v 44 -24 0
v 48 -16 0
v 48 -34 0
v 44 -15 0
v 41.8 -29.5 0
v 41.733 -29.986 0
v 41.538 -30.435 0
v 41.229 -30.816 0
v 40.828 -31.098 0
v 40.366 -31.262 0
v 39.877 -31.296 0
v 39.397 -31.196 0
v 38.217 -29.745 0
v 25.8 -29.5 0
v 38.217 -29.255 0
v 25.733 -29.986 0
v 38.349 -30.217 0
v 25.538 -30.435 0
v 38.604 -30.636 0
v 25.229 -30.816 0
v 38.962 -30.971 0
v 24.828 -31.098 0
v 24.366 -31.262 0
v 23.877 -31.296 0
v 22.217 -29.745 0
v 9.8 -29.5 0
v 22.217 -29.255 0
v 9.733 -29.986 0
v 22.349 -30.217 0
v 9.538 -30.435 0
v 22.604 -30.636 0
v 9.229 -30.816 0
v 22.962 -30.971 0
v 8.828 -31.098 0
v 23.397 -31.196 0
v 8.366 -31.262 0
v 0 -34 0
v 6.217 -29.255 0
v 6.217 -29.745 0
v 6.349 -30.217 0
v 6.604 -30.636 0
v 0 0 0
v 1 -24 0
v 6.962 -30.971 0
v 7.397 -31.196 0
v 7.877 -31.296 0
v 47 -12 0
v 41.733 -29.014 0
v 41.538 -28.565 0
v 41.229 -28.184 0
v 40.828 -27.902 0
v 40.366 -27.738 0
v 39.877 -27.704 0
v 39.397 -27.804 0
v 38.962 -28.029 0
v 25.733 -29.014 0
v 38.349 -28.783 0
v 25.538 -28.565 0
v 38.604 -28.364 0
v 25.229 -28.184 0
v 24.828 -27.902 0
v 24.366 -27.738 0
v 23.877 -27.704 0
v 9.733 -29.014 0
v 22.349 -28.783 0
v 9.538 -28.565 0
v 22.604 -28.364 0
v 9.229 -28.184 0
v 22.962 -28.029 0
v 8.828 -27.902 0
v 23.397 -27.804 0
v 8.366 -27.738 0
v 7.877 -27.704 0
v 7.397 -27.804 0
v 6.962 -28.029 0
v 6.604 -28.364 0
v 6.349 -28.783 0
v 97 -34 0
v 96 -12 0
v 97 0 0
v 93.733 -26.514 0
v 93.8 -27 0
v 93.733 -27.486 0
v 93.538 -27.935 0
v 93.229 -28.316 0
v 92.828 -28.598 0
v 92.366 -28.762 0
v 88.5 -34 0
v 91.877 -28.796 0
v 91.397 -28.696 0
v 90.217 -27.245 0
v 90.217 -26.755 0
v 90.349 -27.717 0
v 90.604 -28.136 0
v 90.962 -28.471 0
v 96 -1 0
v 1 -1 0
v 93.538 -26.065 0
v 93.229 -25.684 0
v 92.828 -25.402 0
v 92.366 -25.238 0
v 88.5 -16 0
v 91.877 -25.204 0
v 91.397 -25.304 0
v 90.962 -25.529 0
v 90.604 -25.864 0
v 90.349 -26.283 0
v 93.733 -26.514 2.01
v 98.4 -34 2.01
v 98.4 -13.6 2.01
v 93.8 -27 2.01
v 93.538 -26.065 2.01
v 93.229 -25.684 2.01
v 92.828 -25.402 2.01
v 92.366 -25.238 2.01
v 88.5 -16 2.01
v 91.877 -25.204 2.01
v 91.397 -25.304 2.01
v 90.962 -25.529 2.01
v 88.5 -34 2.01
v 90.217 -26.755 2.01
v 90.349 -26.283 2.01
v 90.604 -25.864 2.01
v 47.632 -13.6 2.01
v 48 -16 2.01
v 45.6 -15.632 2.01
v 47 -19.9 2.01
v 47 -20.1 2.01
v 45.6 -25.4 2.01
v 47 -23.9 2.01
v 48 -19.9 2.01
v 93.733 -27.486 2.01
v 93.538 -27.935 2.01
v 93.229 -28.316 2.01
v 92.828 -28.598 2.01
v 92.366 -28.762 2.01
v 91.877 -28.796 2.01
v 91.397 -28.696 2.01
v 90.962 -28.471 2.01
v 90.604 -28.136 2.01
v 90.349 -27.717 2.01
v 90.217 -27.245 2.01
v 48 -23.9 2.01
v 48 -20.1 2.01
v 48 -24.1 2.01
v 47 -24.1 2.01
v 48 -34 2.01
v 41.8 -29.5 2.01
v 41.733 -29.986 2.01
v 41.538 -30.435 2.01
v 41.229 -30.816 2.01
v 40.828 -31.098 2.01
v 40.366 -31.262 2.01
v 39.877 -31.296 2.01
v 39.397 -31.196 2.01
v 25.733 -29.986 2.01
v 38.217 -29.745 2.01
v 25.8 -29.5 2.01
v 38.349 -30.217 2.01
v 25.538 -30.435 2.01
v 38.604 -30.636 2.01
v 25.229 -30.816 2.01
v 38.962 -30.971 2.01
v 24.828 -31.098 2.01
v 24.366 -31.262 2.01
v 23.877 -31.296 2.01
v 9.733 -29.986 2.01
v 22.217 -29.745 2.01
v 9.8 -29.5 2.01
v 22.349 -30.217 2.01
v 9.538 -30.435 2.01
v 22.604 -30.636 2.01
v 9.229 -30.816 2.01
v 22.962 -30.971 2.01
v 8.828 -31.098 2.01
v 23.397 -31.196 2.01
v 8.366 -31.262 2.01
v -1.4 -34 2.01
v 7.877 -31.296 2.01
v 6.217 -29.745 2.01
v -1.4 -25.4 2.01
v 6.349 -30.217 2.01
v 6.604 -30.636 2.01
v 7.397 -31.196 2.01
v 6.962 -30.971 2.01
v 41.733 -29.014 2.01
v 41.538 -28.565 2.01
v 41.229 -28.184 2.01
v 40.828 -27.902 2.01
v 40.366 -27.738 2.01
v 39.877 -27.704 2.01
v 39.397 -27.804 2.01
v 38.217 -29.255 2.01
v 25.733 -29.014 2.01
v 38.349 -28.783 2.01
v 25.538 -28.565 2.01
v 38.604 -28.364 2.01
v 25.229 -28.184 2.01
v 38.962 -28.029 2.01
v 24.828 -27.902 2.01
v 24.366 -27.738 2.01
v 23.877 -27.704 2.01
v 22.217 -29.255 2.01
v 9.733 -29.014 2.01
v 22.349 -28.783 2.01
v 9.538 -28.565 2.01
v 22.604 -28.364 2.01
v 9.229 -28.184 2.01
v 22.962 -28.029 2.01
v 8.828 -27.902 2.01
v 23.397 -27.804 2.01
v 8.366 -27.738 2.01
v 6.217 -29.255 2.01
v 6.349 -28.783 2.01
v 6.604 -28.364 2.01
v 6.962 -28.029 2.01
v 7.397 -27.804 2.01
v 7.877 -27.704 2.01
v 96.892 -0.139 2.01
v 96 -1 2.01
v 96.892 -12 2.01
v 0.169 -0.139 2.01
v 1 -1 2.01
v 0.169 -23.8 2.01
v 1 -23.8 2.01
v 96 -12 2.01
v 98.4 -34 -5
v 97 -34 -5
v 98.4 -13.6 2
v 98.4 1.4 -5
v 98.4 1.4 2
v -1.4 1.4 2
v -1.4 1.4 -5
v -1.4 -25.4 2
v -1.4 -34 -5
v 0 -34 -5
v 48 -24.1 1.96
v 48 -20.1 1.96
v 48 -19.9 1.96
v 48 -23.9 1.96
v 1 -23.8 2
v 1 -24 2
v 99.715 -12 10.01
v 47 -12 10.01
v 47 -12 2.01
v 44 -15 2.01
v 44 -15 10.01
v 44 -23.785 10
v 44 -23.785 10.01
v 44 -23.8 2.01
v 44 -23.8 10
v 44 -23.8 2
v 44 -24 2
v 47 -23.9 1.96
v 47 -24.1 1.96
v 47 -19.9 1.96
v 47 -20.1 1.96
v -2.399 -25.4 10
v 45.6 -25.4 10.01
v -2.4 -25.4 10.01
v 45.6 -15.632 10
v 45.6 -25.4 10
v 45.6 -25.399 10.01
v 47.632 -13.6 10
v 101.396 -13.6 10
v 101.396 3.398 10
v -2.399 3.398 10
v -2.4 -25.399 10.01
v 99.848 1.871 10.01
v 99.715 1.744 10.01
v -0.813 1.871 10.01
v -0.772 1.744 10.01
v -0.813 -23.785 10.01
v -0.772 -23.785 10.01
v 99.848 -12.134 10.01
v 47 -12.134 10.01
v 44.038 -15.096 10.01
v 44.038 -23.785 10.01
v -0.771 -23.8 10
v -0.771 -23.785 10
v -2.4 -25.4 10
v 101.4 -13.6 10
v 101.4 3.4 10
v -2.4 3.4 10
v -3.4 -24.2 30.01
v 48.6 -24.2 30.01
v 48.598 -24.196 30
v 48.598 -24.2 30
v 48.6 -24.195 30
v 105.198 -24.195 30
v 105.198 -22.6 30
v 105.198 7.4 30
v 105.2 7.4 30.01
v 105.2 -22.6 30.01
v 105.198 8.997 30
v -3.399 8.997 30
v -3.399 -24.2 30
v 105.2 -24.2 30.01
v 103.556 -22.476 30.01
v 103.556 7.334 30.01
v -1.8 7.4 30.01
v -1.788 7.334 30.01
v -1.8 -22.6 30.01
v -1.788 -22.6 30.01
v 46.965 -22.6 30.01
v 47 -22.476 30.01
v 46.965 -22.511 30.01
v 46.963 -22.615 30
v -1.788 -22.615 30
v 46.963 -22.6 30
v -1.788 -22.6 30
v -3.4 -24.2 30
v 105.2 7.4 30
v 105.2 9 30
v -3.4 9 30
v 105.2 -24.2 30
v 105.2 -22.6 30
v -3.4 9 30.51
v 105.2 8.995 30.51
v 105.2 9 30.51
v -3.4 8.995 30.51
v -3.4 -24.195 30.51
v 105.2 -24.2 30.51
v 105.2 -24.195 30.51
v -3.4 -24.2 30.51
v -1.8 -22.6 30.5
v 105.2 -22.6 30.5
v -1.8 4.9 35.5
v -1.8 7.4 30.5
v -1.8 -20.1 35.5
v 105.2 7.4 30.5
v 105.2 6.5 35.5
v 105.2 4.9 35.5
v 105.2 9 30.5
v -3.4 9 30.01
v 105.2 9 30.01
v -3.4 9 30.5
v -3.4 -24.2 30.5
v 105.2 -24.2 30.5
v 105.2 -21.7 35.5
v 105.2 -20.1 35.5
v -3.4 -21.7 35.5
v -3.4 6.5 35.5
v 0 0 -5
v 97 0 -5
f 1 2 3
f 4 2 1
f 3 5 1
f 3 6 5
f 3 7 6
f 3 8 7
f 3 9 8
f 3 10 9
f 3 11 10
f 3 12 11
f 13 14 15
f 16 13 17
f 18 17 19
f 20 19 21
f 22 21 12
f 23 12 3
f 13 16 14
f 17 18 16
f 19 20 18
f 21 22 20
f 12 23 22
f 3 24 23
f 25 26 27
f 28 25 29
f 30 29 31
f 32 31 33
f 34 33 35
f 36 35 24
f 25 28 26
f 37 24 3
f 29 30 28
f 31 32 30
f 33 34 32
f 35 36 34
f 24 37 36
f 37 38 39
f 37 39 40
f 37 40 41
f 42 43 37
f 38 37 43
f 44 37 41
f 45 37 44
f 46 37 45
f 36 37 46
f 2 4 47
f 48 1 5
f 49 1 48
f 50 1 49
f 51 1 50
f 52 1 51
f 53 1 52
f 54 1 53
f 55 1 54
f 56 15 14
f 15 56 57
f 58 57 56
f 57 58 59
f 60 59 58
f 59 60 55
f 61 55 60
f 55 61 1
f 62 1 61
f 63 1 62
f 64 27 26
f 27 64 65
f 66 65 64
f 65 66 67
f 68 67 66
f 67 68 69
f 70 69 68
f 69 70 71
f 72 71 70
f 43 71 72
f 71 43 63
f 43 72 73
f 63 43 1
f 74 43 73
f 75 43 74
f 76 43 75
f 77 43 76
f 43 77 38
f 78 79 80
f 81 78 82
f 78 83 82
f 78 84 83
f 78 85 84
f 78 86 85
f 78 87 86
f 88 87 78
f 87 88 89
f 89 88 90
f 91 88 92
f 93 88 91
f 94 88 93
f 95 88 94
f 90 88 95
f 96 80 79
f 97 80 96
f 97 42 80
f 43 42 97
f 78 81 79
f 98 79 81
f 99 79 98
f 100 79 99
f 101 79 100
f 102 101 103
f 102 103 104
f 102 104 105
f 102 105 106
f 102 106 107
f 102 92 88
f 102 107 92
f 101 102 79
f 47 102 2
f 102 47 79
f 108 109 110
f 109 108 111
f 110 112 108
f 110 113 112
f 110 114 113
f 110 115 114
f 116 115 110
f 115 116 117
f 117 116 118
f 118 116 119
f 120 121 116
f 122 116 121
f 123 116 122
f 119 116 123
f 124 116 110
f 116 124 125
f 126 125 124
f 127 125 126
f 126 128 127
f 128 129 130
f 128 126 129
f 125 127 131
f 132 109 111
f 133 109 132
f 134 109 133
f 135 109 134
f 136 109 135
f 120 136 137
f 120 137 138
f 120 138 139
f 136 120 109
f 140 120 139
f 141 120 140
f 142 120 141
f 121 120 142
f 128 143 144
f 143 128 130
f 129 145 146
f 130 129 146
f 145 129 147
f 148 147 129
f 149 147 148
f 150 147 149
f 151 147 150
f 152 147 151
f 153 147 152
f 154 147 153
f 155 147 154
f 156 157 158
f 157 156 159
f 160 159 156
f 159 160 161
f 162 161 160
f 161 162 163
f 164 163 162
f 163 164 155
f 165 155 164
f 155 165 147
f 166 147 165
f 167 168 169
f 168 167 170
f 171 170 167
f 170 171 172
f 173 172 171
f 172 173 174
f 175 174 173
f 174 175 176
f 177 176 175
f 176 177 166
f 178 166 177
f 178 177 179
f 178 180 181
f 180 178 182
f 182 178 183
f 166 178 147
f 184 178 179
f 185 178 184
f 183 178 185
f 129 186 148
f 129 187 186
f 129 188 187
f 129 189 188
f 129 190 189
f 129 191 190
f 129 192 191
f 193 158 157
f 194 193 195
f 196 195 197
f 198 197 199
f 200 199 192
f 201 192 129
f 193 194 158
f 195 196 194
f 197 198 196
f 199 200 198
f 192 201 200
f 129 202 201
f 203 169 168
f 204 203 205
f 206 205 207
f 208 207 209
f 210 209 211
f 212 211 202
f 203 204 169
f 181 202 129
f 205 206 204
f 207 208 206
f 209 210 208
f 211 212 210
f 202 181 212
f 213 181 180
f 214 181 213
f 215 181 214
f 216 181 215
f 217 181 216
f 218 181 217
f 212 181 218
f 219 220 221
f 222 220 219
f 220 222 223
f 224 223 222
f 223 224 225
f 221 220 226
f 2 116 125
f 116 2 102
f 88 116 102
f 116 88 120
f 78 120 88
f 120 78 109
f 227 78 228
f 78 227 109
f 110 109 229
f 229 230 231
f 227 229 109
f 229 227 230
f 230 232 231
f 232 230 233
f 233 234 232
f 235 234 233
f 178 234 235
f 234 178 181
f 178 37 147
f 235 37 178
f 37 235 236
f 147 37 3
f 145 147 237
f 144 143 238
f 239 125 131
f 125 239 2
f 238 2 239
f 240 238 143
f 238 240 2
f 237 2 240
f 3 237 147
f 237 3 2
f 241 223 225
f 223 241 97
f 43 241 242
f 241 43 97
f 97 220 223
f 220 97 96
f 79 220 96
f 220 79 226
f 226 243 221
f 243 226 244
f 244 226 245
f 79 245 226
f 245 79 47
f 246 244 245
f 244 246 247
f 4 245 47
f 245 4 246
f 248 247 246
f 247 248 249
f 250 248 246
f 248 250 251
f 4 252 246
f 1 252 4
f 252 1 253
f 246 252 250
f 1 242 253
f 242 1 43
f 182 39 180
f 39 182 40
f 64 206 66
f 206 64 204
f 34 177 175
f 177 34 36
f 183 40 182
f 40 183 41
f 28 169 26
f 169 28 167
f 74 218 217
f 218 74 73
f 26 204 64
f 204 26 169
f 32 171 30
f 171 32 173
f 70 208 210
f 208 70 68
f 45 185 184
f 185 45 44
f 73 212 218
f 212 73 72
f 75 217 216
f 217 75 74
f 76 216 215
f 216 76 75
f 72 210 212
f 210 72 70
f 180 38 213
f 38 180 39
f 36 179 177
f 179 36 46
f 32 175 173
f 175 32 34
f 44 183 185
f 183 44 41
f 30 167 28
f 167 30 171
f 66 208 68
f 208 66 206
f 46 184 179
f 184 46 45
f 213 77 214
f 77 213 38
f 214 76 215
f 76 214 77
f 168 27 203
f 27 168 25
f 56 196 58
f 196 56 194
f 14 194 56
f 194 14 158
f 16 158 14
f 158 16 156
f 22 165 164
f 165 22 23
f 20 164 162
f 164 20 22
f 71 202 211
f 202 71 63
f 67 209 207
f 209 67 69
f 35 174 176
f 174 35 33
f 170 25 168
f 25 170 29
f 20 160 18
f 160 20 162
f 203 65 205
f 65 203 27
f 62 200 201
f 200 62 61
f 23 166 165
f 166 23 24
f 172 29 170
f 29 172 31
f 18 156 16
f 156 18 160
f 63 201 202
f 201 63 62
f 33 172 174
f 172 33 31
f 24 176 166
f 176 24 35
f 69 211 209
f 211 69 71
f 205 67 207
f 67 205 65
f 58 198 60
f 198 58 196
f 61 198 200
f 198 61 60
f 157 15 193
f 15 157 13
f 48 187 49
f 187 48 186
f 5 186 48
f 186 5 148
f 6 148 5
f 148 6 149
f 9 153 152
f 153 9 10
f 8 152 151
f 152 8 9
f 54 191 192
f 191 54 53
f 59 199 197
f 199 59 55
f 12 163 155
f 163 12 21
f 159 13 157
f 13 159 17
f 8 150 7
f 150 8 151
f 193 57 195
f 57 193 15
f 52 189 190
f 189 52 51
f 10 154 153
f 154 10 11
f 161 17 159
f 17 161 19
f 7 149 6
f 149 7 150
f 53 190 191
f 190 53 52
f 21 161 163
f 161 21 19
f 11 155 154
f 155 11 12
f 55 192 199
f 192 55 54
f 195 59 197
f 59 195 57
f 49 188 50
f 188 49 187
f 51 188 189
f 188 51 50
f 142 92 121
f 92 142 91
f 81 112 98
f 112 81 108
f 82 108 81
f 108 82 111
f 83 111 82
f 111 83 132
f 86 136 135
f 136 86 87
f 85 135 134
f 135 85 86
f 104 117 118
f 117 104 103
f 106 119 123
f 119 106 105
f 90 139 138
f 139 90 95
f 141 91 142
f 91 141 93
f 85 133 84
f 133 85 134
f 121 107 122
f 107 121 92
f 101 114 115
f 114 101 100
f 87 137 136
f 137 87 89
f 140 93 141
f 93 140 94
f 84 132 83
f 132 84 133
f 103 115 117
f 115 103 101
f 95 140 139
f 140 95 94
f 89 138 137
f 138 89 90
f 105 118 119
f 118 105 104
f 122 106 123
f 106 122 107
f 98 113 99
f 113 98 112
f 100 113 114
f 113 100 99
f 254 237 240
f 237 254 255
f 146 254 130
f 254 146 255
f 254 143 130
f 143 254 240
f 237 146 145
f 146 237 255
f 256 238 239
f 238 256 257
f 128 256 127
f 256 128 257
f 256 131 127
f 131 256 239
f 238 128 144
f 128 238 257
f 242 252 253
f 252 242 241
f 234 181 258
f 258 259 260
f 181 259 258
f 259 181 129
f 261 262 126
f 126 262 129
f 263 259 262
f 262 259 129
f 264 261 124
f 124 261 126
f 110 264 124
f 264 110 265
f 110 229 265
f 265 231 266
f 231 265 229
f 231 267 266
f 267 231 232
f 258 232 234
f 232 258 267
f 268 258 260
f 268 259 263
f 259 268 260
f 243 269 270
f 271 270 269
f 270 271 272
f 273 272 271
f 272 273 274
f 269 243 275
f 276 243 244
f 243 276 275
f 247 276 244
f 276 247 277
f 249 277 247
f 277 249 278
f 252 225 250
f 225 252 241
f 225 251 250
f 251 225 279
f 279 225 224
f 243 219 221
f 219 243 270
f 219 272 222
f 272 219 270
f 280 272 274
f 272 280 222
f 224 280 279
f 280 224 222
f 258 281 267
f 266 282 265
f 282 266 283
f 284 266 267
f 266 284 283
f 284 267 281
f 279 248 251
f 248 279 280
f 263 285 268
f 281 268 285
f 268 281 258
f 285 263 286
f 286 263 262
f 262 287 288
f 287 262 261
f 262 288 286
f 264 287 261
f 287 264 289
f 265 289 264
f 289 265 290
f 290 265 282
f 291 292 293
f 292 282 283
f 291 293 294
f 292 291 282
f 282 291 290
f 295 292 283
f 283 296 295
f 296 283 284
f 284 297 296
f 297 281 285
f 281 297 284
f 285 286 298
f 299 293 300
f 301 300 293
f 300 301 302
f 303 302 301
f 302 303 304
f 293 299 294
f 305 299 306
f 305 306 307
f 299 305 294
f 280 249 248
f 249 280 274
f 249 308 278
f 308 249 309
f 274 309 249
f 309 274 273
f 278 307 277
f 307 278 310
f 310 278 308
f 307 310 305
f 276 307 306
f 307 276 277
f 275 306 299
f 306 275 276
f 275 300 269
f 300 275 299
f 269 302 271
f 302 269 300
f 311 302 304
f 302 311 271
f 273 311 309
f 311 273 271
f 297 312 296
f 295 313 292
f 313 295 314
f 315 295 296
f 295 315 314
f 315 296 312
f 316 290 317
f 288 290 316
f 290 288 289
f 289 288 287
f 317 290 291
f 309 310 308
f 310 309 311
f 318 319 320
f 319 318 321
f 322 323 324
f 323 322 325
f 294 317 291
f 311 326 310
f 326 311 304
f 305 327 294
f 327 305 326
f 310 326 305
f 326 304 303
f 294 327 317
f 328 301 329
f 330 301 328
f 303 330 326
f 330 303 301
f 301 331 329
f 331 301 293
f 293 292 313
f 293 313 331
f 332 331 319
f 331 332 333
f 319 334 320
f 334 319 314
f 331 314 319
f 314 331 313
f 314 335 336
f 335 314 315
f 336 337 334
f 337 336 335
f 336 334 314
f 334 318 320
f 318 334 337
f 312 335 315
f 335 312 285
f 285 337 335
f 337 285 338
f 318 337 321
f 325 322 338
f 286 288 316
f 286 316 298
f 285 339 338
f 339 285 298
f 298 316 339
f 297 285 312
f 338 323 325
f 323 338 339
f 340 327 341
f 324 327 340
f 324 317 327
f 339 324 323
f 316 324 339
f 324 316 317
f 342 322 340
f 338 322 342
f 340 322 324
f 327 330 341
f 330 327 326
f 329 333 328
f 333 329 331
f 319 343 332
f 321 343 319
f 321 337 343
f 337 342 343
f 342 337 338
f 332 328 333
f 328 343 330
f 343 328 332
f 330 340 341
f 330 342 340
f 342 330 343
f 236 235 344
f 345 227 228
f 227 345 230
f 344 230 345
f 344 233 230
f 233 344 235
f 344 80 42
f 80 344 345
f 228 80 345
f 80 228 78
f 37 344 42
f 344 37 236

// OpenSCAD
$fs=0.5;
$fa=1;
$fn=0;

module lip(th = 2) {
  //th = 2;
  linear_extrude(5.01) polygon([
    [-th, th], [97+th, th], [97+th, -34], [97, -34], [97, 0], [0, 0], [0, -34], [-th, -34]
   ]);
}

module mask(th = 2) {
  //th = 2;
  shape = [
    [-th, th], [97+th, th], [97+th, -34], [95-6.5, -34],
    [95-6.5, -16], [1+43+4, -16], [1+43+4, -34], [-th, -34]
  ];
  hole = [
    [1, -1], [96, -1], [96, -12], [1+43+3, -12],
    [1+43, -12-3], [1+43, -24], [1, -24]];

  difference() {
    linear_extrude(2.01) polygon(concat(shape, hole), [[0, 1, 2, 3, 4, 5, 6, 7], [8, 9, 10, 11, 12, 13, 14]]);
  
    translate([8, -34+4.5, -0.5]) cylinder(h = 3, r = 1.8);
    translate([8+16, -34+4.5, -0.5]) cylinder(h = 3, r = 1.8);
    translate([8+16+16, -34+4.5, -0.5]) cylinder(h = 3, r = 1.8);
    translate([95-3, -34+7, -0.5]) cylinder(h = 3, r = 1.8);
    translate([1+43+3.5, -24, 2.01]) cube([1, 0.2, 0.1], center=true);
    translate([1+43+3.5, -20, 2.01]) cube([1, 0.2, 0.1], center=true);
  }
}

function reverse(list) = [ for (i = [len(list)-1 : -1 : 0]) list[i] ];

// https://stackoverflow.com/a/78582473
module extrude_between(points0, points1, height, convexity=2) {
    N = len(points0);
    assert(len(points1) == N);
    bottom_pts = [for (i=[0:N-1]) [points0[i].x, points0[i].y, 0]];
    top_pts    = [for (i=[0:N-1]) [points1[i].x, points1[i].y, height]];
    bottom_face = [for (i=[0:N-1]) i];
    top_face    = [for (i=[0:N-1]) 2*N - i - 1];
    side_faces  = [for (i=[0:N-1]) let (j=(i+1)%N) [i+N, j+N, j, i]];
    polyhedron(
        [each bottom_pts, each top_pts],
        [bottom_face, each side_faces, top_face],
        convexity=convexity
    );
}


/*module duct1(lipth, dth = 2) {
  shape = [
    [-lipth, lipth], [97+lipth, lipth], [97+lipth, -12-dth], [1+43+3+sqrt(dth)/2, -12-dth],
    [1+43+dth, -12-3-sqrt(dth)/2], [1+43+dth, -26+(dth-1)], [-lipth, -26+(dth-1)],
  ];

  hole = [
    [shape[0][0]+dth, shape[0][1]-dth],
    [shape[1][0]-dth, shape[1][1]-dth],
    [shape[2][0]-dth, shape[2][1]+dth],
    [shape[3][0]-sqrt(dth)/2, shape[3][1]+dth],
    [shape[4][0]-dth, shape[4][1]+sqrt(dth)/2],
    [shape[5][0]-dth, shape[5][1]+dth],
    [shape[6][0]+dth, shape[6][1]+dth],
  ];

    linear_extrude(10.01) polygon(concat(shape, hole), [[0, 1, 2, 3, 4, 5, 6], [7, 8, 9, 10, 11, 12, 13]]);  
}*/

module duct1(lipth, dth = 2) {
  shape0 = [
    [-lipth, lipth],
    [97+lipth, lipth],
    [97+lipth, -12-dth],
    [1+43+3+sqrt(dth)/2, -12-dth],
    [1+43+dth, -12-3-sqrt(dth)/2],
    [1+43+dth, -26+(dth-1)],
    [-lipth, -26+(dth-1)],
  ];

  skewLeft = 1;
  skewTop = 2;
  skewRight = 3;

  shape1 = [
    [shape0[0][0]-skewLeft, shape0[0][1]+skewTop],
    [shape0[1][0]+skewRight, shape0[1][1]+skewTop],
    [shape0[2][0]+skewRight, shape0[2][1]],
    shape0[3],
    shape0[4],
    shape0[5],
    [shape0[6][0]-skewLeft, shape0[6][1]],
  ];

  //extrude_between(shape0, shape1, 8.01);
  
  hole0 = [
    [shape0[0][0]+dth, shape0[0][1]-dth],
    [shape0[1][0]-dth, shape0[1][1]-dth],
    [shape0[2][0]-dth, shape0[2][1]+dth],
    [shape0[3][0]-sqrt(dth)/2, shape0[3][1]+dth],
    [shape0[4][0]-dth, shape0[4][1]+sqrt(dth)/2],
    [shape0[5][0]-dth, shape0[5][1]+dth],
    [shape0[6][0]+dth, shape0[6][1]+dth],
  ];

  hole1 = [
    [hole0[0][0]-skewLeft, hole0[0][1]+skewTop],
    [hole0[1][0]+skewRight, hole0[1][1]+skewTop],
    [hole0[2][0]+skewRight, hole0[2][1]],
    hole0[3],
    hole0[4],
    hole0[5],
    [hole0[6][0]-skewLeft, hole0[6][1]],
  ];

    difference() {
      extrude_between(reverse(shape0), reverse(shape1), 8.01);
      translate([0, 0, -0.25]) extrude_between(reverse(hole0), reverse(hole1), 8.5);
    }
}

module duct2(lipth, dth = 2) {
  shape0 = [
    [-1-lipth, 2+lipth],
    [100+lipth, 2+lipth],
    [100+lipth, -12-dth],
    [1+43+3+sqrt(dth)/2, -12-dth],
    [1+43+dth, -12-3-sqrt(dth)/2],
    [1+43+dth, -26+(dth-1)],
    [-1-lipth, -26+(dth-1)],
  ];

  skewLeft = 1;
  skewTop = 4 + dth;
  skewRight = 3.8;
  skewBottomNarrow = 9 + dth;

  shape1 = [
    [shape0[0][0]-skewLeft, shape0[0][1]+skewTop],
    [shape0[1][0]+skewRight, shape0[1][1]+skewTop],
    [shape0[2][0]+skewRight, shape0[2][1]-skewBottomNarrow],
    [shape0[3][0]+5,shape0[3][1]-skewBottomNarrow],
    [shape0[4][0]+3,shape0[3][1]-skewBottomNarrow],
    [shape0[5][0]-5,shape0[3][1]-skewBottomNarrow],
    [shape0[6][0]-skewLeft, shape0[3][1]-skewBottomNarrow],
  ];

  hole0 = [
    [shape0[0][0]+dth, shape0[0][1]-dth],
    [shape0[1][0]-dth, shape0[1][1]-dth],
    [shape0[2][0]-dth, shape0[2][1]+dth],
    [shape0[3][0]-sqrt(dth)/2, shape0[3][1]+dth],
    [shape0[4][0]-dth, shape0[4][1]+sqrt(dth)/2],
    [shape0[5][0]-dth, shape0[5][1]+dth],
    [shape0[6][0]+dth, shape0[6][1]+dth],
  ];

  hole1 = [
    [hole0[0][0]-skewLeft, hole0[0][1]+skewTop],
    [hole0[1][0]+skewRight, hole0[1][1]+skewTop],
    [hole0[2][0]+skewRight, hole0[2][1]-skewBottomNarrow],
    [hole0[3][0]+5, hole0[3][1]-skewBottomNarrow],
    [hole0[4][0]+3, hole0[3][1]-skewBottomNarrow],
    [hole0[5][0]-5, hole0[3][1]-skewBottomNarrow],
    [hole0[6][0]-skewLeft, hole0[3][1]-skewBottomNarrow],
  ];
  echo("topleft", shape1[0]);
  echo("fanx", shape1[1][0] - shape1[0][0] - dth);
  echo("fany", hole1[1][1] - hole1[6][1]);
    difference() {
      extrude_between(reverse(shape0), reverse(shape1), 20.01);
      translate([0, 0, -0.25]) extrude_between(reverse(hole0), reverse(hole1), 20.5);
    }
}

module fanmount (dth = 2) {
  shape0 = [
    [-dth, dth],
    [107, dth],
    [107, 0],
    [0, 0],
    [0, -30],
    [107, -30],
    [107, -30-dth],
    [-dth, -30-dth]];
  translate([dth, -dth, 0]) linear_extrude(0.51) polygon(shape0);

  narrow = 2.5;

  shape1 = [
    [-dth, dth-narrow],
    [107, dth-narrow],
    [107, -narrow],
    [0, -narrow],
    [0, -30+narrow],
    [107, -30+narrow],
    [107, -30-dth+narrow],
    [-dth, -30-dth+narrow]
  ];
  
  translate([dth, -dth, 0.5]) extrude_between(reverse(shape0), reverse(shape1), 5);
  
}

translate([0, 0, -5]) lip(1.4);
mask(1.4);
translate([0, 0, 2]) duct1(1.4, 1.6);
translate([0, 0, 10]) duct2(1.4, 1.6);
translate([-3.4, 9, 30]) fanmount(1.6);
